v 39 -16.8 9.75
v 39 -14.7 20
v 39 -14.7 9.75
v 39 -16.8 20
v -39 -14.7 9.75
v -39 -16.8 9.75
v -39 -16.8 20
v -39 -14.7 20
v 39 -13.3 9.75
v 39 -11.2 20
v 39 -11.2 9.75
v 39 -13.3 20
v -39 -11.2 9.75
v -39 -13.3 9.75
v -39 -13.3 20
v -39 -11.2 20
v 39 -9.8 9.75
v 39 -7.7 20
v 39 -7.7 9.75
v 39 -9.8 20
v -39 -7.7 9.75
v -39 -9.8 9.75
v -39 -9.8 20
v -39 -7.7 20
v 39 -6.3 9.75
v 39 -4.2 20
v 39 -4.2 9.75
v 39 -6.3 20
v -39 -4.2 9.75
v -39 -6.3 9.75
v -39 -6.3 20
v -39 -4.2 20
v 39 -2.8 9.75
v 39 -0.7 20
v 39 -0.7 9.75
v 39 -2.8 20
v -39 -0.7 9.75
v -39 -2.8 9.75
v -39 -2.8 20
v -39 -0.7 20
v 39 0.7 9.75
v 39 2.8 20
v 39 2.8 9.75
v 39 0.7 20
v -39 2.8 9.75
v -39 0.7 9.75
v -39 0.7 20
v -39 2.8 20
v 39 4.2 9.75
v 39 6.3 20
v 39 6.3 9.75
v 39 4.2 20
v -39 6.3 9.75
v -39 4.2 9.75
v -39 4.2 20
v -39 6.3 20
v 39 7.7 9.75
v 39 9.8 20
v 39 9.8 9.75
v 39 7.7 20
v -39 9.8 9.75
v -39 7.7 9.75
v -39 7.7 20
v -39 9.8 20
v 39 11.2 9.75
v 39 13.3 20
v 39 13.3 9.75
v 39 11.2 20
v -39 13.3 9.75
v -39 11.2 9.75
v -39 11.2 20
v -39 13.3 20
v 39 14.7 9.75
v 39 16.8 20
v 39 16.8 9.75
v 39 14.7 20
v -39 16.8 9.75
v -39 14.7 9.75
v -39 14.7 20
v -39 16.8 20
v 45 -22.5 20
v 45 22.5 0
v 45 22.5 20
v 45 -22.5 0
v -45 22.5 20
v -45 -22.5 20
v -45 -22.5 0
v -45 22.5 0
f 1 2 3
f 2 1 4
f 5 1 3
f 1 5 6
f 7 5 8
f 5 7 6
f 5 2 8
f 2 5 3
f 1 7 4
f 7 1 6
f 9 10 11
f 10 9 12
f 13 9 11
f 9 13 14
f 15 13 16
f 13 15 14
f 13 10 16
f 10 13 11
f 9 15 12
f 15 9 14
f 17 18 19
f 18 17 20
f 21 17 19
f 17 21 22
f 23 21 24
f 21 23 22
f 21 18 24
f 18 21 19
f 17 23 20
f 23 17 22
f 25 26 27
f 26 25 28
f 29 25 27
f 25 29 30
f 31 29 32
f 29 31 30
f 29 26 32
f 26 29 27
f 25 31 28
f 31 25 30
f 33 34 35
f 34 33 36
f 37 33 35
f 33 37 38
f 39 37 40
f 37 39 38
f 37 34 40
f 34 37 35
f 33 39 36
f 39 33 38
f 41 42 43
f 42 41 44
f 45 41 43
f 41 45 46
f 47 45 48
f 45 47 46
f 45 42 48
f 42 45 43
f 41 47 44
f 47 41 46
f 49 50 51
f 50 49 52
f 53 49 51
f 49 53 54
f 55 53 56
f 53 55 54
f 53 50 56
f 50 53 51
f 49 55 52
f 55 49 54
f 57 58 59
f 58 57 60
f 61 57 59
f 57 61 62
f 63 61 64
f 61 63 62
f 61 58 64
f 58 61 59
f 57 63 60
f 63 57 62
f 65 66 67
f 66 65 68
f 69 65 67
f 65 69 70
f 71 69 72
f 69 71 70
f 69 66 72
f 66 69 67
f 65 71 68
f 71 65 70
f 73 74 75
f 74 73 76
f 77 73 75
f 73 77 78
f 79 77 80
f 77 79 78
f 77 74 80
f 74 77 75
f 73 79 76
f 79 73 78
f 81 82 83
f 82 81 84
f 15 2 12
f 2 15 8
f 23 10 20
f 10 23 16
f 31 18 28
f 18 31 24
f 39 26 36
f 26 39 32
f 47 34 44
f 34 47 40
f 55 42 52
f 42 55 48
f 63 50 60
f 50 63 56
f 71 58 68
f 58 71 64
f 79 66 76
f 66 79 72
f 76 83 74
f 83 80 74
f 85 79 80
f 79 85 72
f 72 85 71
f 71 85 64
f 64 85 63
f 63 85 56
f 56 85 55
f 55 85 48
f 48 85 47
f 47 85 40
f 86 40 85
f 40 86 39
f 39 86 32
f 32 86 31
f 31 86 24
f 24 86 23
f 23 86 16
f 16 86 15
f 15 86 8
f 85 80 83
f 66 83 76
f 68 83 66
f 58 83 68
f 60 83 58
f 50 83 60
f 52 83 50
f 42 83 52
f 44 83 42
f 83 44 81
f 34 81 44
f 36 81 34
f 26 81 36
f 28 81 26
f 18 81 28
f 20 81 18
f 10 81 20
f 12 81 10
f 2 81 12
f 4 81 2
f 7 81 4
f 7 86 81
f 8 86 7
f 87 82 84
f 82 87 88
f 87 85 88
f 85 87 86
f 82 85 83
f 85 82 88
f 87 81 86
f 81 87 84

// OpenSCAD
// Microscope slide holder - holds 10 slides (75x25x1 mm) standing vertically
// Base block dimensions
block_length_x = 90;    // Length in X direction (mm)
block_width_y = 45;     // Width in Y direction (mm)
block_height_z = 20;    // Height in Z direction (mm)

// Groove dimensions
groove_length_x = 77;   // Groove length along X (mm)
groove_width_y = 1.6;   // Groove width in Y direction (mm)
groove_depth_z = 10;    // Groove depth in Z direction (mm)

// Groove array parameters
num_grooves = 10;       // Number of grooves
groove_spacing_y = 3.5; // Center-to-center spacing in Y (mm)

// Calculate groove positions to center the array
total_groove_span_y = (num_grooves - 1) * groove_spacing_y;
groove_start_y = -total_groove_span_y / 2;

$fn = 64;

difference() {
    // Solid base block, centered in X and Y, resting on XY plane at z=0
    translate([0, 0, block_height_z/2]) {
        cube([block_length_x, block_width_y, block_height_z], center = true);
    }
    
    // Cut 10 parallel grooves on top surface
    for (i = [0:num_grooves-1]) {
        groove_y = groove_start_y + i * groove_spacing_y;
        
        // Each groove: centered in X, positioned in Y, from top down
        // Opens at top, extends to 10 mm depth
        translate([0, groove_y, block_height_z - groove_depth_z/2]) {
            cube([groove_length_x + 1, groove_width_y + 0.5, groove_depth_z + 0.5], center = true);
        }
    }
}
